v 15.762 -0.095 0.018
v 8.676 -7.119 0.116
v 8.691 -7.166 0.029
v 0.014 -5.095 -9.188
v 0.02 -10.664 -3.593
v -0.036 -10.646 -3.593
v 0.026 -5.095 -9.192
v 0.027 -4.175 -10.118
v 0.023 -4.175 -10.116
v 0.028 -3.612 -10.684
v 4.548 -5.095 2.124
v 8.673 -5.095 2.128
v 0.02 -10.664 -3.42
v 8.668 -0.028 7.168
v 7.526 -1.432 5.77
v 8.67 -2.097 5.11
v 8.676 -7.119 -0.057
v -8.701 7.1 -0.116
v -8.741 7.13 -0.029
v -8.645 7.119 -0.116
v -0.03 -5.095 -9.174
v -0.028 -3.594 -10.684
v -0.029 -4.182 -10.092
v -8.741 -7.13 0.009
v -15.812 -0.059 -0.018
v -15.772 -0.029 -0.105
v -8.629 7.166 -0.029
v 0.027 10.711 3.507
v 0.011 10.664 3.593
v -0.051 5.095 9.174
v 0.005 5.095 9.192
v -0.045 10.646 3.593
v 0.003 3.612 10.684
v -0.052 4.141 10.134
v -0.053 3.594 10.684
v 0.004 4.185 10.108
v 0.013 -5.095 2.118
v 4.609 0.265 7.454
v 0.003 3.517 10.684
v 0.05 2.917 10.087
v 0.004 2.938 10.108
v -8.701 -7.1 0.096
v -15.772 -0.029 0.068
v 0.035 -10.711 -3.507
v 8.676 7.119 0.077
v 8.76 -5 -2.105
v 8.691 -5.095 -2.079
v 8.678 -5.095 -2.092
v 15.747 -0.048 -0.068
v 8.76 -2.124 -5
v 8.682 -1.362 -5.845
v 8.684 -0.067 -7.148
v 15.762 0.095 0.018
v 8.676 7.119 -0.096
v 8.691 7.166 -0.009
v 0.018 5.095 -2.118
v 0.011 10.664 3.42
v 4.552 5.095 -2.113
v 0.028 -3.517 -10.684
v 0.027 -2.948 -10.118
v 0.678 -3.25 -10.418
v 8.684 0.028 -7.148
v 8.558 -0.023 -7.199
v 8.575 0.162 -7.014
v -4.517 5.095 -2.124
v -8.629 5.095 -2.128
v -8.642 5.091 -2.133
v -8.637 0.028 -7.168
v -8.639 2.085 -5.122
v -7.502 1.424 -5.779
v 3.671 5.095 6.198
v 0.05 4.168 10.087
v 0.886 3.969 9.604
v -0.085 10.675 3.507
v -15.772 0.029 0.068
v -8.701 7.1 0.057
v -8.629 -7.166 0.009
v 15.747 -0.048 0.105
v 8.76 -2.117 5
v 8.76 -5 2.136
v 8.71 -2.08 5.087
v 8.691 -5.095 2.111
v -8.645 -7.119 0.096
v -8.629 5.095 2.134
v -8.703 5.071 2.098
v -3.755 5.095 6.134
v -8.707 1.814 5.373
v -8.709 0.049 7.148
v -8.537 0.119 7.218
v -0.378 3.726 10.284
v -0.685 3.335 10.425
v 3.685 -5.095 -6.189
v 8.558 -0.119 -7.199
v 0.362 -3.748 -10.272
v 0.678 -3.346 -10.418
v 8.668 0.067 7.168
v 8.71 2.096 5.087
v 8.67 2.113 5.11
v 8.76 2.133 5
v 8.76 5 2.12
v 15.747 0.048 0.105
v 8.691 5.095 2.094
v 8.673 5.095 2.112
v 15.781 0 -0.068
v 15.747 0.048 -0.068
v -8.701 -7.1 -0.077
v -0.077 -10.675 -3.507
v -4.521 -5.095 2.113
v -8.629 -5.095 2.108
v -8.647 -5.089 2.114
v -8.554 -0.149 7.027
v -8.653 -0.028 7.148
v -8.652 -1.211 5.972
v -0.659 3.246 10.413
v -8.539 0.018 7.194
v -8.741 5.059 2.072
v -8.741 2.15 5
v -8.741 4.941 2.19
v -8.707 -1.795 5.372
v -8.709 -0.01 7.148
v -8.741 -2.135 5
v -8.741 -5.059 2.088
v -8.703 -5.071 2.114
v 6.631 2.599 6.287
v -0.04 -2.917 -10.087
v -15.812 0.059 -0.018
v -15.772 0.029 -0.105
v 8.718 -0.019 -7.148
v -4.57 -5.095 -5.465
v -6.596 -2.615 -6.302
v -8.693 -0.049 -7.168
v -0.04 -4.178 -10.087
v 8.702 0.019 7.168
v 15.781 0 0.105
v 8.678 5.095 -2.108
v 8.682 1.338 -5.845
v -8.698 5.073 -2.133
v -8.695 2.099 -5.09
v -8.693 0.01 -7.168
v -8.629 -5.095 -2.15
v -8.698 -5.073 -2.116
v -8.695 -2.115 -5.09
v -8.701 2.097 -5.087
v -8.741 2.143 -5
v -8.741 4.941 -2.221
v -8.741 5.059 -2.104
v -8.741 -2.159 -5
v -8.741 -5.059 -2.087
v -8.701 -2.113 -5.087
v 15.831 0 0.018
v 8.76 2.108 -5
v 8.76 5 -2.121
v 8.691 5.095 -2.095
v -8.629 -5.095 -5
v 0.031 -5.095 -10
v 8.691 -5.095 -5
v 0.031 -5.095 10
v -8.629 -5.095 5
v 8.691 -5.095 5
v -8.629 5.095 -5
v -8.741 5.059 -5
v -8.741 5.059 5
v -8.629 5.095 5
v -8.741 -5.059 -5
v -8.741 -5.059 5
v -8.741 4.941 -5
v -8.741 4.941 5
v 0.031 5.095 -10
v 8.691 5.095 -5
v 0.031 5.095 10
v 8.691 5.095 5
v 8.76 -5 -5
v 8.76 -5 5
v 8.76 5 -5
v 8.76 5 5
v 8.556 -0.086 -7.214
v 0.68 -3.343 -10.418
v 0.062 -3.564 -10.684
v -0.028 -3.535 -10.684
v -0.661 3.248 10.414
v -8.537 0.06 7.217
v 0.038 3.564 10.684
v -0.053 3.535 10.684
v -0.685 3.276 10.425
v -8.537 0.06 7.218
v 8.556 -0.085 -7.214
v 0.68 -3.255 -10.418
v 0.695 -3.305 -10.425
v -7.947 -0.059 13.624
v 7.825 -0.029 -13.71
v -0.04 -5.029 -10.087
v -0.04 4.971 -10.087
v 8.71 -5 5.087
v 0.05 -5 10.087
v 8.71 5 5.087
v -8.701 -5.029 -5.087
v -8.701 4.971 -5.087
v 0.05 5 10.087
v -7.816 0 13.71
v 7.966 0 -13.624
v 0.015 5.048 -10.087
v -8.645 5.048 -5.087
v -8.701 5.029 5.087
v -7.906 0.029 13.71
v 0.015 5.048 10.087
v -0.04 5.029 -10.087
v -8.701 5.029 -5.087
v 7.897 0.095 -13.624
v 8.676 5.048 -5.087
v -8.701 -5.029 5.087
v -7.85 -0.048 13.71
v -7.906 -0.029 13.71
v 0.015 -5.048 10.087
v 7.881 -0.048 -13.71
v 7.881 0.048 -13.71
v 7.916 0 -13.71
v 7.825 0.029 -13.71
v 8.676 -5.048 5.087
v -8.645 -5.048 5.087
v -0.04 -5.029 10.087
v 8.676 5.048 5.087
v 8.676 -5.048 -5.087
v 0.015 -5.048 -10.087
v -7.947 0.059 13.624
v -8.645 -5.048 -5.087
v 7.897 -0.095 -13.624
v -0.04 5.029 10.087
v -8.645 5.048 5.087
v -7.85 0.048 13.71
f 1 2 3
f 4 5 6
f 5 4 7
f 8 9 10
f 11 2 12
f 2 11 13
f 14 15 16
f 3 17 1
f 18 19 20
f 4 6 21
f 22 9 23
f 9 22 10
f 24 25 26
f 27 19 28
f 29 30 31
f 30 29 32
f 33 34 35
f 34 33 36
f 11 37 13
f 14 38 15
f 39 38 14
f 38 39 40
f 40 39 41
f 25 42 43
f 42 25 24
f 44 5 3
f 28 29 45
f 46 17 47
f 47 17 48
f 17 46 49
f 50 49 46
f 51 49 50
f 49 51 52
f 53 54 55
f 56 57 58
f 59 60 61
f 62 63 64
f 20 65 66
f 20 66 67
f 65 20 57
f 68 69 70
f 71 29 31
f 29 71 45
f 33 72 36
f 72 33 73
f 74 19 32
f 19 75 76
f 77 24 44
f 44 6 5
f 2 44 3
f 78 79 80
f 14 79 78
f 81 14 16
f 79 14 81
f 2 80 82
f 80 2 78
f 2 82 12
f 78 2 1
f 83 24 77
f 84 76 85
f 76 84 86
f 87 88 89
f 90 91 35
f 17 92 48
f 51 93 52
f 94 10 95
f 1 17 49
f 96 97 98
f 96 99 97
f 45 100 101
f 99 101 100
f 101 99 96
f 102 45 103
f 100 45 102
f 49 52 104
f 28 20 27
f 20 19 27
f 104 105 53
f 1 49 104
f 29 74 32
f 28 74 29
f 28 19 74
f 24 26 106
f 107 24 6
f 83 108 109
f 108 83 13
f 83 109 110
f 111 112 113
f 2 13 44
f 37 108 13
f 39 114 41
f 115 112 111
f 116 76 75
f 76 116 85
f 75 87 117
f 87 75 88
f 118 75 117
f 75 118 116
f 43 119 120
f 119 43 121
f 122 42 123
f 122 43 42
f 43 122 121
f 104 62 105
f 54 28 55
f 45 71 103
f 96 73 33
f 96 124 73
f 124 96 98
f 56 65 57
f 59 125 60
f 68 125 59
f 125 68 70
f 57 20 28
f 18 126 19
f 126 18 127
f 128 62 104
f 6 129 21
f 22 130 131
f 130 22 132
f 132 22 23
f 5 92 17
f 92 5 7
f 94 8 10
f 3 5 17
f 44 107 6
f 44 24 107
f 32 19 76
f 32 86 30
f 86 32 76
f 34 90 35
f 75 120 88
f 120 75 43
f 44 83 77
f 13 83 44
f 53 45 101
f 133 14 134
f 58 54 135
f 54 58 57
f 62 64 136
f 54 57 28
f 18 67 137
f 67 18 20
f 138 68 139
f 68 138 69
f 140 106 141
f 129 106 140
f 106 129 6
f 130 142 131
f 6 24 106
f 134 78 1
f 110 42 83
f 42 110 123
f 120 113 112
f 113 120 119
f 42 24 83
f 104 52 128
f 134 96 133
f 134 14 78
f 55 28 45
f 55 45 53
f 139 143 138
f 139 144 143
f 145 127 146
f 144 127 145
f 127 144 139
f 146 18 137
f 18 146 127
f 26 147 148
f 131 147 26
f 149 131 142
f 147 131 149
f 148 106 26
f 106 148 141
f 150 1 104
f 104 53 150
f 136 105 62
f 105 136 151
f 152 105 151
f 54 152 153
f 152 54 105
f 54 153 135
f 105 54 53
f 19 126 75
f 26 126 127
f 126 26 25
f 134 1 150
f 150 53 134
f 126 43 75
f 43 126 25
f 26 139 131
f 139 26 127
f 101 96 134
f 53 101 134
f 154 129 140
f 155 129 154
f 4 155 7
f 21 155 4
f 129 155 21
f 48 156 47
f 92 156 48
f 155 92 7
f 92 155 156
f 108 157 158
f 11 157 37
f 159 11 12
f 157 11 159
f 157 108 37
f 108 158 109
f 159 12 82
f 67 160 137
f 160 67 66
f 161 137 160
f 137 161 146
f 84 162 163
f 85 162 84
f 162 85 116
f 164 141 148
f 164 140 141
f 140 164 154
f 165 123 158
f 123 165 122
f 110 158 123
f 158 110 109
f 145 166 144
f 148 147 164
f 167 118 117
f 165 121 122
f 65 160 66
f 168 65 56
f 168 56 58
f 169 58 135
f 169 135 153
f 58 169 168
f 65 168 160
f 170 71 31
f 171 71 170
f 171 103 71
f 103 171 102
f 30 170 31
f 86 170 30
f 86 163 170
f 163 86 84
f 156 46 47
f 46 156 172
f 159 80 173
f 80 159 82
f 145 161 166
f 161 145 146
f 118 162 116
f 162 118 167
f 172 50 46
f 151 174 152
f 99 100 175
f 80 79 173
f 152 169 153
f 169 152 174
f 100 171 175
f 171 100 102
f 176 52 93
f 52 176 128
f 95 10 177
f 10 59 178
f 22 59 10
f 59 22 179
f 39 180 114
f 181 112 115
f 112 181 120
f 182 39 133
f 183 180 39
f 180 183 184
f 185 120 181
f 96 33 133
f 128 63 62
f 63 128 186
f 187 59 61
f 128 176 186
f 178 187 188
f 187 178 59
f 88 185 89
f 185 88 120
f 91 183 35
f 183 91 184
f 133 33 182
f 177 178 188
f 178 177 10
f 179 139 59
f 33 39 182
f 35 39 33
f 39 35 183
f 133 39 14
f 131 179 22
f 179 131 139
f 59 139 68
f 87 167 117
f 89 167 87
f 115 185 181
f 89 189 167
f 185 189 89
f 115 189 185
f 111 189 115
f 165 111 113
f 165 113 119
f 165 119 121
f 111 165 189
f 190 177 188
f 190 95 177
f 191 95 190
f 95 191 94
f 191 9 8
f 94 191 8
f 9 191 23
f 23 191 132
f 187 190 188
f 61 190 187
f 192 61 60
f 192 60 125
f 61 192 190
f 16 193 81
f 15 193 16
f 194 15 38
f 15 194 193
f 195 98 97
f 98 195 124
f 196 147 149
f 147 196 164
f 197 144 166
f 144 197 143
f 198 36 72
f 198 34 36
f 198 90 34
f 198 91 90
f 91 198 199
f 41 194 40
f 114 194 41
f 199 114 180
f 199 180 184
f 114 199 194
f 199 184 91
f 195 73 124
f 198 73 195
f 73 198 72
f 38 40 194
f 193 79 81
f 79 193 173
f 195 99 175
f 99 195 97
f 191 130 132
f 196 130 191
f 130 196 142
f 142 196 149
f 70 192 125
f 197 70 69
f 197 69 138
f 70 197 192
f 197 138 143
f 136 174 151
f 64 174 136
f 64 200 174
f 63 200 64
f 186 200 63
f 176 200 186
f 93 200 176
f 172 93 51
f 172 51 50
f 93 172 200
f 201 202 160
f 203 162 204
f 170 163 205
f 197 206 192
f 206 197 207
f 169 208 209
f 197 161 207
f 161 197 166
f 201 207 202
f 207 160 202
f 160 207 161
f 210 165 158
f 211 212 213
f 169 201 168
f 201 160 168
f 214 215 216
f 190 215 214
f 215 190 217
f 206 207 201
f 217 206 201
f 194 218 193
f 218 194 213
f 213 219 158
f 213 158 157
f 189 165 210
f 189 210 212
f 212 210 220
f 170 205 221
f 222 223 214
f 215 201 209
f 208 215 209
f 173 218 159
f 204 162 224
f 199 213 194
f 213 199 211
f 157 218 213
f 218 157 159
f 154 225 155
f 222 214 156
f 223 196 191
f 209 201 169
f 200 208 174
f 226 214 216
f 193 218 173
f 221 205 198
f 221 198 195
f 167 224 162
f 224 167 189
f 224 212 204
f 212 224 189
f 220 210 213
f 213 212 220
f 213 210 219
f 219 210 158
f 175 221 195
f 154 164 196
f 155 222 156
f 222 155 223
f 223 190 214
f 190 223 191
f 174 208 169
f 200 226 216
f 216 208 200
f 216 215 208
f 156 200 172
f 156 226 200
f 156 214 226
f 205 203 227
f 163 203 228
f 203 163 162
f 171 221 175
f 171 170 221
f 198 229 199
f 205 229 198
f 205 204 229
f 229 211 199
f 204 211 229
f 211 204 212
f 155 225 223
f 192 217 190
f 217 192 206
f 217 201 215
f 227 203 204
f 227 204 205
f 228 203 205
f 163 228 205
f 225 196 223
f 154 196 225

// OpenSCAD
// Auto-generated OpenSCAD file

    inner_points = 10*[[0.8660275601949093, -0.49999626496864946, -0.5000000000002527], [0.8660232473576305, 0.5000037350220502, -0.5000000000001439], [2.1564184105024137e-06, -0.49999999999524114, -1.0000000000000544], [-2.156418868470349e-06, 0.4999999999954585, -0.9999999999999456], [2.156418868470349e-06, -0.4999999999954585, 0.9999999999999456], [-2.1564184105024137e-06, 0.49999999999524114, 1.0000000000000544], [-0.8660232473576305, -0.5000037350220502, 0.5000000000001439], [-0.8660275601949093, 0.49999626496864946, 0.5000000000002527], [0.8660275601951383, -0.49999626496875815, 0.49999999999974737], [0.8660232473578595, 0.5000037350219414, 0.4999999999998561], [-0.8660232473578595, -0.5000037350219414, -0.4999999999998561], [-0.8660275601951383, 0.49999626496875815, -0.49999999999974737], [0.7865660924778658, 3.3923317141515653e-06, -1.3623724356959748], [-0.7865660924778658, -3.3923317141515653e-06, 1.3623724356959748]];

    outer_points = 10*[[0.8668436236259911, -0.0019279514490723182, -0.7061008534070546], [0.8660225906704068, -0.707104152868027, 0.002930775546985575], [0.866027055663365, 0.707104152868027, -0.0009251247660098337], [0.8652060227077807, 0.0019279514490723182, 0.7081065041880305], [-0.8652060227077807, -0.0019279514490723182, -0.7081065041880305], [-0.866027055663365, -0.707104152868027, 0.0009251247660098337], [-0.8660225906704068, 0.707104152868027, -0.002930775546985575], [-0.8668436236259911, 0.0019279514490723182, 0.7061008534070546], [0.0012270844404182679, -0.35644400360762196, -1.0596915431180651], [0.0004060514848339595, -1.0616202050265766, -0.3506599141640247], [-0.0004060514848339595, 1.0616202050265766, 0.3506599141640247], [-0.0012270844404182679, 0.35644400360762196, 1.0596915431180651], [1.573131130281187, 0.0, 0.0018216288930887289], [-1.573131130281187, 0.0, -0.0018216288930887289]];

    // Convex hull for inner set (I)
    module inner_hull() {
        hull() {
            for (p = inner_points) {
                translate(p) sphere(r=0.1);
            }
        }
    }

    // Convex hull for outer set (O) minus inner hull (O \ I)
    module outer_minus_inner() {
        difference() {
            hull() {
                for (p = outer_points) {
                    translate(p) sphere(r=0.1);
                }
            }
            inner_hull(); // Subtract inner hull
        }
    }

    // Convex hull for outer set (O) minus all translated inner hulls
    module outer_minus_AllTranslationInner() {
        difference() {
            hull() {
                for (p = outer_points) {
                    translate(p) sphere(r=0.1);
                }
            }
            hull() {
                translate([0,0,50]) inner_hull();
                translate([0,0,-50]) inner_hull();
            }; // Subtract translated inner hulls
        }
    }

    // Difference between outer_minus_inner and outer_minus_AllTranslationInner
    module outer_minus_inner_diff() {
        difference() {
            // Outer minus inner
            difference() {
                hull() {
                    for (p = outer_points) {
                        translate(p) sphere(r=0.1);
                    }
                }
                inner_hull();
            }

            // Subtract Outer minus AllTranslationInner
            difference() {
                hull() {
                    for (p = outer_points) {
                        translate(p) sphere(r=0.1);
                    }
                }
                hull() {
                    translate([0,0,50]) inner_hull();
                    translate([0,0,-50]) inner_hull();
                };
            }
        }
    }

    // Rendering all with colors applied
    color([1, 0, 0, 0.5]) inner_hull(); // Transparent red
    color([0, 1, 0, 1]) outer_minus_AllTranslationInner(); // Opaque green
    color([1, 1, 0, 1]) outer_minus_inner_diff(); // Opaque yellow
    
